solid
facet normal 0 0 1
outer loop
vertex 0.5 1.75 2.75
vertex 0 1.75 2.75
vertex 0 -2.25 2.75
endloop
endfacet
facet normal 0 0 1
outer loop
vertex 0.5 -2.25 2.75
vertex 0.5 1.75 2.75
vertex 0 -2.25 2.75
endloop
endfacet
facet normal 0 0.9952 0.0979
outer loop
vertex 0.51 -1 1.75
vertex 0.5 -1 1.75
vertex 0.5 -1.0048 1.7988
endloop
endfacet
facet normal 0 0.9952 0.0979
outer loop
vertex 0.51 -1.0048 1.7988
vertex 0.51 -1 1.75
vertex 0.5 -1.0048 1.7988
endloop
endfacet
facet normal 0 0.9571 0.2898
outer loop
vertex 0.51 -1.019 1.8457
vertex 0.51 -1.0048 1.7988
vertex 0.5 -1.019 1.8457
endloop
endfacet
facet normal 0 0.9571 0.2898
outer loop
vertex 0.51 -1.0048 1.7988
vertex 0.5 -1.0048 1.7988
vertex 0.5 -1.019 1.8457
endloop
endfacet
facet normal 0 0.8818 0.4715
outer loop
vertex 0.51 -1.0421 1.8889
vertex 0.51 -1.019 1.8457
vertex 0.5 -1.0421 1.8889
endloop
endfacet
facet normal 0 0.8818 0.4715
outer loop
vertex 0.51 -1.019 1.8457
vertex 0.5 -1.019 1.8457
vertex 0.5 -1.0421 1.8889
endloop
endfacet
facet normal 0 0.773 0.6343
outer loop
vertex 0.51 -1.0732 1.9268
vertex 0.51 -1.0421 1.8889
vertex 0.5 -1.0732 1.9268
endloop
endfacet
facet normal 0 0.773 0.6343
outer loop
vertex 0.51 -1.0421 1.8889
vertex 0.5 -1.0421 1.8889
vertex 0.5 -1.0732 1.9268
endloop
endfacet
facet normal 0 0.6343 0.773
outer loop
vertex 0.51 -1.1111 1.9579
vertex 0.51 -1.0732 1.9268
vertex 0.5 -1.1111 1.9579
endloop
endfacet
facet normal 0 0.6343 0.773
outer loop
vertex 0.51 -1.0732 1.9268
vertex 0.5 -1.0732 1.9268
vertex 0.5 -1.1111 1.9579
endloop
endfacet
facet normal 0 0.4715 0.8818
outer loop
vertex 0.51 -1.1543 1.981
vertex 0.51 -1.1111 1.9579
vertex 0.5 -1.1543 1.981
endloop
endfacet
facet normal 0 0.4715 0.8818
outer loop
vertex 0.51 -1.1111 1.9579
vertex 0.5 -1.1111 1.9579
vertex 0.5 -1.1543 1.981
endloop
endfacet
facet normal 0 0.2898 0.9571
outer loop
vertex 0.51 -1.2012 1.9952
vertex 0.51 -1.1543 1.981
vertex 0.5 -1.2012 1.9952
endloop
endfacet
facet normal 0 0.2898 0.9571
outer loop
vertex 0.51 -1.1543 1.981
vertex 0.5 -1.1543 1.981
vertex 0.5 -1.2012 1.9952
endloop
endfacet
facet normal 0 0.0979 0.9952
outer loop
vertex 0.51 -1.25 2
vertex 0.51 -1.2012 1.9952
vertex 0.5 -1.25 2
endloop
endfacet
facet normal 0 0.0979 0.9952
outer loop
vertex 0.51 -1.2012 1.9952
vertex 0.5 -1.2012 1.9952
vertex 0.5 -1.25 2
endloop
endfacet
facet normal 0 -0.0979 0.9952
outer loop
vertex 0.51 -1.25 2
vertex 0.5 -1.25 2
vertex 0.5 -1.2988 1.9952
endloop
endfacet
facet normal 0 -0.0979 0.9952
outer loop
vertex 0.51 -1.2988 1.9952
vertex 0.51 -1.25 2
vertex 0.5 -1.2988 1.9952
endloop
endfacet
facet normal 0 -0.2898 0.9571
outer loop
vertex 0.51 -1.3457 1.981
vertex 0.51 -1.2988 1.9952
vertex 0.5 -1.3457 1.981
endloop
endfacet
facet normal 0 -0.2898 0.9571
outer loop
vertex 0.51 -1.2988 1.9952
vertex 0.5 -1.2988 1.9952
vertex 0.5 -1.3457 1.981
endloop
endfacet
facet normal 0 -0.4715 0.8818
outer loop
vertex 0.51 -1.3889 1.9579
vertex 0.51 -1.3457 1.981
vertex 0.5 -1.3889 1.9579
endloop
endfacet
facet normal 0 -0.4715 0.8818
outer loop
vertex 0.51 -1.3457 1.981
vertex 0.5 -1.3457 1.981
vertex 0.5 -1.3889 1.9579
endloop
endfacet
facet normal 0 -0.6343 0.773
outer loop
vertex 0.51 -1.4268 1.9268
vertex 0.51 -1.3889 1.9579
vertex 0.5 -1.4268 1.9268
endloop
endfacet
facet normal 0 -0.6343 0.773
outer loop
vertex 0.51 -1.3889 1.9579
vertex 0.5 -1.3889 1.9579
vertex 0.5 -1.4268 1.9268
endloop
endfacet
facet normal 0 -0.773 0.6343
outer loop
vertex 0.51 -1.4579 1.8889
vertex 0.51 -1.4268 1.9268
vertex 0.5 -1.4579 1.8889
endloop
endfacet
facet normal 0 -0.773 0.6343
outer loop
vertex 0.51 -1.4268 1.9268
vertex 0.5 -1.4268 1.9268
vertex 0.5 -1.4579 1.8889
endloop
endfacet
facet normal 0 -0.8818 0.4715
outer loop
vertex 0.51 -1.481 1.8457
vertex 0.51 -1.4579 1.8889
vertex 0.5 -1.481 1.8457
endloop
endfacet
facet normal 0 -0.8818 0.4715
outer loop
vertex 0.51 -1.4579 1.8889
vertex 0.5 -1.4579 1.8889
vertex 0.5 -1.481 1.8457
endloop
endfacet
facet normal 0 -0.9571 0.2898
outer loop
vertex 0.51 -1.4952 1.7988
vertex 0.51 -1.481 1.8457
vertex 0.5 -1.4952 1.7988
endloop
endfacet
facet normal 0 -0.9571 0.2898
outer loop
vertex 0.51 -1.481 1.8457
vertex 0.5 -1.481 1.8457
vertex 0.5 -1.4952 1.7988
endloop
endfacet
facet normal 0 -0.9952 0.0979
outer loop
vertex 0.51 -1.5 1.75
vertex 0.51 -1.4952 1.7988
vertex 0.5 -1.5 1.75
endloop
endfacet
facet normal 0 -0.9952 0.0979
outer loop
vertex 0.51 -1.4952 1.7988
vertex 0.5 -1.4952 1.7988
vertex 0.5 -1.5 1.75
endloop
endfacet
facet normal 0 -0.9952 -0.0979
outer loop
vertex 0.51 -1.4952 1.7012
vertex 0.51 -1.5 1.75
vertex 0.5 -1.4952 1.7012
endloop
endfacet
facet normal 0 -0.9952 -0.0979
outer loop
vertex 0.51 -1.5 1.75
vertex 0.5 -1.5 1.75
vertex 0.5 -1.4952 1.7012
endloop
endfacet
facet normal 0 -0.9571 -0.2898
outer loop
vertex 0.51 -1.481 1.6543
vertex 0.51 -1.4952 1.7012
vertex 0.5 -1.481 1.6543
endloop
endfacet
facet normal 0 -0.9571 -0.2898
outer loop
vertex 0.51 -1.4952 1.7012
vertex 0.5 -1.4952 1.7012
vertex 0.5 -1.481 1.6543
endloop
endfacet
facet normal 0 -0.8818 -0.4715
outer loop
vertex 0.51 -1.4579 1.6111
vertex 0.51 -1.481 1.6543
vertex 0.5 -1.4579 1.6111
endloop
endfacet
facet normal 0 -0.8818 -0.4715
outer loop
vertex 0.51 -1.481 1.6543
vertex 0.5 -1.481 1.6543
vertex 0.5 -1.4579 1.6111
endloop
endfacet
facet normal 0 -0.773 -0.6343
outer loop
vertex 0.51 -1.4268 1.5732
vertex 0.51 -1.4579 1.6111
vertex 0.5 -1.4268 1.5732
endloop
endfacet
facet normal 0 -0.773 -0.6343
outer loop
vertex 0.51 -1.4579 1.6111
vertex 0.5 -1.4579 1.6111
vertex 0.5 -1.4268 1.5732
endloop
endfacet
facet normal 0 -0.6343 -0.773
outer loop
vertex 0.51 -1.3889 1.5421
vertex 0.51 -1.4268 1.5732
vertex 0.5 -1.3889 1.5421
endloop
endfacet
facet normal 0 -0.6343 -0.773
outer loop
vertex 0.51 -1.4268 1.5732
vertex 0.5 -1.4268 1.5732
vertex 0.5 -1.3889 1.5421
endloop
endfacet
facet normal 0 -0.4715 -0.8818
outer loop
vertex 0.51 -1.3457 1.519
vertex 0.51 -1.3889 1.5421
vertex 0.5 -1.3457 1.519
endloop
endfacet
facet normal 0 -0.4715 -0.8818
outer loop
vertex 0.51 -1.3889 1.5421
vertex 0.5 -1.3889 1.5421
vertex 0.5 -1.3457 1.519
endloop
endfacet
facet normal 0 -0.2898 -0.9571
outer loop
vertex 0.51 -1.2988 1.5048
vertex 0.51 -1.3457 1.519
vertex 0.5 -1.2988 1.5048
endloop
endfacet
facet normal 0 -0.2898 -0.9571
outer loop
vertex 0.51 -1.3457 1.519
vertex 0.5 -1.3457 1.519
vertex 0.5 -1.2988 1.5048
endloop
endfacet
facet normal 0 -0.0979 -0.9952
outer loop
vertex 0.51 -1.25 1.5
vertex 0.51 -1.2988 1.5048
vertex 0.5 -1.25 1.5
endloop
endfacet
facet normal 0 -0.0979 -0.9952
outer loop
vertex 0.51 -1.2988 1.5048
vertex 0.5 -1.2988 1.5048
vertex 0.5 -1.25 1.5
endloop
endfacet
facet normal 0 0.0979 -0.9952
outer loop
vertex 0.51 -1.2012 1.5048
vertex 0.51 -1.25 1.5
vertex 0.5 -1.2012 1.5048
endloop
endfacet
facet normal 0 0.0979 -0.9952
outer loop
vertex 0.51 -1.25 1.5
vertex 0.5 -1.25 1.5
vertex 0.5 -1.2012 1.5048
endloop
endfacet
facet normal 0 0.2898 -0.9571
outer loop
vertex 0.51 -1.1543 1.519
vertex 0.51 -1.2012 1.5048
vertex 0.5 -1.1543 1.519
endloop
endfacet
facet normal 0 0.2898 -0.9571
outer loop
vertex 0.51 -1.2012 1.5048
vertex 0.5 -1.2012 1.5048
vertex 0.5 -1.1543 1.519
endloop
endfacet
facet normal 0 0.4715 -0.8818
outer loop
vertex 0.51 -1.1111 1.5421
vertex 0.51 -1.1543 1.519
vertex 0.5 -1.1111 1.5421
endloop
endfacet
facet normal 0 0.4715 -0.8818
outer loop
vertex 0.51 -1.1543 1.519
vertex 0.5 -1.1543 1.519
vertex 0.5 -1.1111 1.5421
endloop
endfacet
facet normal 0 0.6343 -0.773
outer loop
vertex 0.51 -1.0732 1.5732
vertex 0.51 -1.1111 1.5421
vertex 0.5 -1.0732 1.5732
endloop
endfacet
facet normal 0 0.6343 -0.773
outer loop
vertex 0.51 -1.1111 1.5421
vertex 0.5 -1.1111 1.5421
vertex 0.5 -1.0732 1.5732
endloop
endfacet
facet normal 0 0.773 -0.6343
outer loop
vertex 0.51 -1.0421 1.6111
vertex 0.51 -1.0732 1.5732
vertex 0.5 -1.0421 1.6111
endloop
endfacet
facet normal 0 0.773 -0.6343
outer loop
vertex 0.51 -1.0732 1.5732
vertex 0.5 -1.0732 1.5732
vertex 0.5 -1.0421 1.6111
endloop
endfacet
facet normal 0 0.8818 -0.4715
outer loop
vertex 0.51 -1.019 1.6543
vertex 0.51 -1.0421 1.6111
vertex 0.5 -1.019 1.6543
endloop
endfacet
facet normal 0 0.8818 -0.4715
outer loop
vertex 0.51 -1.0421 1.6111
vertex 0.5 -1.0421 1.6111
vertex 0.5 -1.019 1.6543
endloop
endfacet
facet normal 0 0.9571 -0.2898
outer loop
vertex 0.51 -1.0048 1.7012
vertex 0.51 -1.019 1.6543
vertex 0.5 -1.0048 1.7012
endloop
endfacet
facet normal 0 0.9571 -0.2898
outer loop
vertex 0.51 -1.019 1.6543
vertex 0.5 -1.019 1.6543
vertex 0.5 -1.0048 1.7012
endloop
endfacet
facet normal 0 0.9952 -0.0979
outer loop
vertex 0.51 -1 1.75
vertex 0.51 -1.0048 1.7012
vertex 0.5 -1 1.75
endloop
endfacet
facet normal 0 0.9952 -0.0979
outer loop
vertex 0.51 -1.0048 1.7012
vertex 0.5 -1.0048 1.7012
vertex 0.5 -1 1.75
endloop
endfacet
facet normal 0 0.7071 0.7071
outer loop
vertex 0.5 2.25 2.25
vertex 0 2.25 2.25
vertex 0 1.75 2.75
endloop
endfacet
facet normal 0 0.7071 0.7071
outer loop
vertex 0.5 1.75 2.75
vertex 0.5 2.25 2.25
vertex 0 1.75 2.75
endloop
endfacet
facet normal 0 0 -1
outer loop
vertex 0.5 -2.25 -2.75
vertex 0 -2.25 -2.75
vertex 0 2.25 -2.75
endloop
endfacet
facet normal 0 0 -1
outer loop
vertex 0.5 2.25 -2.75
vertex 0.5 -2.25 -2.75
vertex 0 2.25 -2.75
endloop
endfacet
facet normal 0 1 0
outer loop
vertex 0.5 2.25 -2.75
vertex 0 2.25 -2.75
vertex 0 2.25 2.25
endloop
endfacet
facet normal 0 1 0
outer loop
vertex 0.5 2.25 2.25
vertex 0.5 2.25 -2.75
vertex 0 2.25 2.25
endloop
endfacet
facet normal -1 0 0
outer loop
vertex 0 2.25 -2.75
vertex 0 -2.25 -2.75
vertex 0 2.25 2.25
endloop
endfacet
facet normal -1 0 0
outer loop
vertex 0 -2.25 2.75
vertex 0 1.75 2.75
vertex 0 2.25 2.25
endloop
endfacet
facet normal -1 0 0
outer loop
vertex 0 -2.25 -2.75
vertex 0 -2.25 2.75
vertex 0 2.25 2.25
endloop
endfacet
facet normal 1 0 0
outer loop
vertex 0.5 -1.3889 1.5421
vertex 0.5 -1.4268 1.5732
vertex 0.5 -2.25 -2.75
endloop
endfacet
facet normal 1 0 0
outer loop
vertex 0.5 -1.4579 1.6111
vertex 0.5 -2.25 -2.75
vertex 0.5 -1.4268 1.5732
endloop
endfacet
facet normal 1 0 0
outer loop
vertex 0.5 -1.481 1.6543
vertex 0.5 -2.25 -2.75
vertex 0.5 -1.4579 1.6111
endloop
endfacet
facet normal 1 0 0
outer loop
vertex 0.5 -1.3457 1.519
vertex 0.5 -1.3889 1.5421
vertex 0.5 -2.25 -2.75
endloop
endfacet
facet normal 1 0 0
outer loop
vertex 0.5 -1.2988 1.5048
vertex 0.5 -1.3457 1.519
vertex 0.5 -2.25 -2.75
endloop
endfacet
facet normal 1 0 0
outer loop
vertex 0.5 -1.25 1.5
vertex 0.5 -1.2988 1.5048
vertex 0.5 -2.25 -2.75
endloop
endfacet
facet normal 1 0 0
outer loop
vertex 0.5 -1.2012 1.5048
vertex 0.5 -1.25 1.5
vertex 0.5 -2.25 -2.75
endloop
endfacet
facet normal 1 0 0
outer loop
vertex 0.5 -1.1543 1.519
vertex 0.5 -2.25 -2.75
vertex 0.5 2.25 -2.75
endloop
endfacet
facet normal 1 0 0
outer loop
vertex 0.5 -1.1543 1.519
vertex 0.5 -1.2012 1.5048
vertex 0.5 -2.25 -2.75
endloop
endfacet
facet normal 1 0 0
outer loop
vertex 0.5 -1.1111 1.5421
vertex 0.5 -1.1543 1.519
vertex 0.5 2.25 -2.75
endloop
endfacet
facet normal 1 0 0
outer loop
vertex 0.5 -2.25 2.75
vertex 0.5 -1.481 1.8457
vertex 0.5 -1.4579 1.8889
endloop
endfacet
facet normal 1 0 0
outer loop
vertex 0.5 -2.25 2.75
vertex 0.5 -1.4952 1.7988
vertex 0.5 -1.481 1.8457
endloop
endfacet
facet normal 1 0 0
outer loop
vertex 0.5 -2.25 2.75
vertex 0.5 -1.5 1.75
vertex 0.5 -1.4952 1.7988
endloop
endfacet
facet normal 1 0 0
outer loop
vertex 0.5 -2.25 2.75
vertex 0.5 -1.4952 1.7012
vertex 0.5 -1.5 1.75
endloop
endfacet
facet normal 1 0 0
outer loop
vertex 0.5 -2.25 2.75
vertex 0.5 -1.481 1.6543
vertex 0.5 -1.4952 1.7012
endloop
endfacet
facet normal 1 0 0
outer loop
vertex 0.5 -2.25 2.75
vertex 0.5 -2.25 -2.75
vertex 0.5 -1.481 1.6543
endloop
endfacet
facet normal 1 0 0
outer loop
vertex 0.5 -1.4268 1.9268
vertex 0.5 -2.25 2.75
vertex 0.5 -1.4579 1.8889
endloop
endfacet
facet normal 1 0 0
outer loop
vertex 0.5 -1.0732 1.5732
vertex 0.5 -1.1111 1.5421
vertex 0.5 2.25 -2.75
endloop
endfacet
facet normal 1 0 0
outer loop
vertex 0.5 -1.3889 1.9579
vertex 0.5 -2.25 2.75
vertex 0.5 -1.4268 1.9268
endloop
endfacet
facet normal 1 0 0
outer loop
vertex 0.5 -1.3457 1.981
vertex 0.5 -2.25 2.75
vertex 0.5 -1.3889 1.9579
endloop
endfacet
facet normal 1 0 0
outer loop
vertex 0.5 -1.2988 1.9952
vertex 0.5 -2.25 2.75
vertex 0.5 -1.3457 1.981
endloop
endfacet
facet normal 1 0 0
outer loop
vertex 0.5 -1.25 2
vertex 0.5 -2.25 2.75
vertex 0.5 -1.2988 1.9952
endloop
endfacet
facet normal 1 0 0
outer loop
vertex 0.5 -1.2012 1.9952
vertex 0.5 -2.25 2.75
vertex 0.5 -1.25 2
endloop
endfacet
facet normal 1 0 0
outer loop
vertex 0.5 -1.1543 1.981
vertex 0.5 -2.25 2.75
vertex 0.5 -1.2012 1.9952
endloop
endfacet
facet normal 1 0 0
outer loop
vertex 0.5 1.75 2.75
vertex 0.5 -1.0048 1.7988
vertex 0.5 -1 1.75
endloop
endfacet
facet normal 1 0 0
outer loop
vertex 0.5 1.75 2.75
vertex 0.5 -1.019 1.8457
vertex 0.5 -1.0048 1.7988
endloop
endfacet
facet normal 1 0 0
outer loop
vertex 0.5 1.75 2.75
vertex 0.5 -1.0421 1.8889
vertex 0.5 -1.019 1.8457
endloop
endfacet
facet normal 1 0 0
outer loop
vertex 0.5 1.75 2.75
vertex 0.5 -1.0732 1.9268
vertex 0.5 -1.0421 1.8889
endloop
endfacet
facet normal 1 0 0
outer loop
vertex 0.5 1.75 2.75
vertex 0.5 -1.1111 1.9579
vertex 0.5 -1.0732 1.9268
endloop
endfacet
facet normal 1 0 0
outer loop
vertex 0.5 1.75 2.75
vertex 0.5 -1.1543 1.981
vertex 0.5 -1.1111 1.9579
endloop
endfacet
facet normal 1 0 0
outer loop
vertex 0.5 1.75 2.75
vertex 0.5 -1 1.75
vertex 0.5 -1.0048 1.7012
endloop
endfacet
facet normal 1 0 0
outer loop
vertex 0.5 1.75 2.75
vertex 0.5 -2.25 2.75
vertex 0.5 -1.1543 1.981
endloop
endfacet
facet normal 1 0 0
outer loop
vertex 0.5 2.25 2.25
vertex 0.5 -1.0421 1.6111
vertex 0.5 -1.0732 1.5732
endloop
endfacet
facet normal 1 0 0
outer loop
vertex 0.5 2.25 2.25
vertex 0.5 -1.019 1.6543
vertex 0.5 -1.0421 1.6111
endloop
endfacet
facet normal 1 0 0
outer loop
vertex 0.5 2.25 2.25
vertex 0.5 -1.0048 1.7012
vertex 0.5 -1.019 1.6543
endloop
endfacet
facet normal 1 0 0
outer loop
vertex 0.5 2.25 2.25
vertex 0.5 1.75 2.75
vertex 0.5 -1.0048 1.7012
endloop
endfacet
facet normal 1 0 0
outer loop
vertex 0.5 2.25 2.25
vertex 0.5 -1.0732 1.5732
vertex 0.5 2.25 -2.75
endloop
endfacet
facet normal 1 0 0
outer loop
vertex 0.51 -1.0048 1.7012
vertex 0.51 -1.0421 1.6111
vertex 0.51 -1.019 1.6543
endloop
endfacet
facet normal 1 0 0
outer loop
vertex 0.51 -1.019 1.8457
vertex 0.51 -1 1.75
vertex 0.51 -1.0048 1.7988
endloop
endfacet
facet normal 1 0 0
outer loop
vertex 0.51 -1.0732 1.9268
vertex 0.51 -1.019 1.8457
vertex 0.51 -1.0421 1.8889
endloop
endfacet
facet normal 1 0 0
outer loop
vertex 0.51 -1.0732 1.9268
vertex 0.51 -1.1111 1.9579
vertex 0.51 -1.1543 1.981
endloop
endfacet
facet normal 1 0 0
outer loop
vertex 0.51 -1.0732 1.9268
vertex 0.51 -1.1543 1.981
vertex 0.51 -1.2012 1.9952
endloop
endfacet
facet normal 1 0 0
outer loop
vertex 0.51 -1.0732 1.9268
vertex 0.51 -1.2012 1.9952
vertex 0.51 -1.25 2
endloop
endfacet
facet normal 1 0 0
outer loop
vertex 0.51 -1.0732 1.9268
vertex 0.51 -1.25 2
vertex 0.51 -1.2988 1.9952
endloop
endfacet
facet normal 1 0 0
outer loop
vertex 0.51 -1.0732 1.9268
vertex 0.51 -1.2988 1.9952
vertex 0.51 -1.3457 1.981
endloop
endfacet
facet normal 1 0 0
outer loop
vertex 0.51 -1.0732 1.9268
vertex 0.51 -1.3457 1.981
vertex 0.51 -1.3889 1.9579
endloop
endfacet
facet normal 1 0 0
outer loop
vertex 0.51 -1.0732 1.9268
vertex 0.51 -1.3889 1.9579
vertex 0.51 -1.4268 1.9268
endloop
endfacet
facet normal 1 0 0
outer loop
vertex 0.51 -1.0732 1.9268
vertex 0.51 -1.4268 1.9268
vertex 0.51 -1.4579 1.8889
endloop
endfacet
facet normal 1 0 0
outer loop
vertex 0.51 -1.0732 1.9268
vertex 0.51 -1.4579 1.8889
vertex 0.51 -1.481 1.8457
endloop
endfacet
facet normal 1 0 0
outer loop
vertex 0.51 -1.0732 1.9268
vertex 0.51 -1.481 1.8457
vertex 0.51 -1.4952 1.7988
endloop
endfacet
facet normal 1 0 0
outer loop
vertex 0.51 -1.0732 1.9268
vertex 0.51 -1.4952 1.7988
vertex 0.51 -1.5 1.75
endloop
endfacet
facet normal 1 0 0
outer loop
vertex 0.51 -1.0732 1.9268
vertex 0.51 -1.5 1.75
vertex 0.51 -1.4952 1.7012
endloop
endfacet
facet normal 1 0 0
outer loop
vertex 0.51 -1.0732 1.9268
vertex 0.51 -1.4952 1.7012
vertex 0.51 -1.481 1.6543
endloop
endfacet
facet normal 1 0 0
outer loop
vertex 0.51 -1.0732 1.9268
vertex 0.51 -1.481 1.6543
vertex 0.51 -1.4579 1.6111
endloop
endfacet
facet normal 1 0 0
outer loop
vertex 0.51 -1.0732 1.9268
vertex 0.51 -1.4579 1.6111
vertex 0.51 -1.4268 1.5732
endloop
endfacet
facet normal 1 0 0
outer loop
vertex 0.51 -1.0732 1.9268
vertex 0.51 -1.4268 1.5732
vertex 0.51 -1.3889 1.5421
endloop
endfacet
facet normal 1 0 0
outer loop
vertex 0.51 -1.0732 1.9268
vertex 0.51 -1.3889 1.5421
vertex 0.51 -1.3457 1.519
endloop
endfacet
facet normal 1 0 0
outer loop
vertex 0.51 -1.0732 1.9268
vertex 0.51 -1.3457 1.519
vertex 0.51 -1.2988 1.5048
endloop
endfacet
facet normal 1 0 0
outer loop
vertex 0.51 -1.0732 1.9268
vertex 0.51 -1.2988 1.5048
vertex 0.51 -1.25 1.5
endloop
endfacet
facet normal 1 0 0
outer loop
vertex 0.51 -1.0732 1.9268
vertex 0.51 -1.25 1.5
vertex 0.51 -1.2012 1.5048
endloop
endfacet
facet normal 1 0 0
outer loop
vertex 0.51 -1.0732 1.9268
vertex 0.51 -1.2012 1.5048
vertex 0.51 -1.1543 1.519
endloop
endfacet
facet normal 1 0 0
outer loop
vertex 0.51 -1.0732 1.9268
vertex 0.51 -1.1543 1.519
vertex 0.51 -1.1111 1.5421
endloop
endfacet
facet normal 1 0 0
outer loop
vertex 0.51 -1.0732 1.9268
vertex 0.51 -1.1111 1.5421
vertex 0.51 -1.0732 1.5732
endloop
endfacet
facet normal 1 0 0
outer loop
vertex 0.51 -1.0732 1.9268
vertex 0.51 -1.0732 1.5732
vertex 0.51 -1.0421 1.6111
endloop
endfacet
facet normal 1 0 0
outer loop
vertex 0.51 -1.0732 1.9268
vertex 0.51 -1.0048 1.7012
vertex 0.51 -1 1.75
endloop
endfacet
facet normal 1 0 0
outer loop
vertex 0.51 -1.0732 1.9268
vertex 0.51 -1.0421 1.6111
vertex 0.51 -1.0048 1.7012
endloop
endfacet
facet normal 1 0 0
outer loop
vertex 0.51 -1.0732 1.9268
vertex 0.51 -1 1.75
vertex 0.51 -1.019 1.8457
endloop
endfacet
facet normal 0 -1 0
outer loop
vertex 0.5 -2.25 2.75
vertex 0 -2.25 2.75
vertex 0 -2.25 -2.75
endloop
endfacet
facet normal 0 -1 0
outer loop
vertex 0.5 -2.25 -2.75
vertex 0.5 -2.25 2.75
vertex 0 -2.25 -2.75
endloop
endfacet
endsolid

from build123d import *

# Parameters (mm, degrees)
PAD_DEPTH    = 0.5
SKETCH001_R  = 0.25
PAD001_DEPTH = 0.01


with BuildPart() as part:
    # Sketch (on YZ_Plane of Origin) → Pad (new body)
    with BuildSketch(Plane.YZ):
        Polygon((-2.25, -2.75), (2.25, -2.75), (2.25, 2.25), (1.75, 2.75), (-2.25, 2.75), align=None)
    extrude(amount=PAD_DEPTH)

    # Sketch001 (on Face7 of Pad) → Pad001 (join)
    with BuildSketch(Plane.YZ.offset(0.5)):
        with Locations((-1.25, 1.75)):
            Circle(SKETCH001_R)
    extrude(amount=PAD001_DEPTH)


solid = part.part
